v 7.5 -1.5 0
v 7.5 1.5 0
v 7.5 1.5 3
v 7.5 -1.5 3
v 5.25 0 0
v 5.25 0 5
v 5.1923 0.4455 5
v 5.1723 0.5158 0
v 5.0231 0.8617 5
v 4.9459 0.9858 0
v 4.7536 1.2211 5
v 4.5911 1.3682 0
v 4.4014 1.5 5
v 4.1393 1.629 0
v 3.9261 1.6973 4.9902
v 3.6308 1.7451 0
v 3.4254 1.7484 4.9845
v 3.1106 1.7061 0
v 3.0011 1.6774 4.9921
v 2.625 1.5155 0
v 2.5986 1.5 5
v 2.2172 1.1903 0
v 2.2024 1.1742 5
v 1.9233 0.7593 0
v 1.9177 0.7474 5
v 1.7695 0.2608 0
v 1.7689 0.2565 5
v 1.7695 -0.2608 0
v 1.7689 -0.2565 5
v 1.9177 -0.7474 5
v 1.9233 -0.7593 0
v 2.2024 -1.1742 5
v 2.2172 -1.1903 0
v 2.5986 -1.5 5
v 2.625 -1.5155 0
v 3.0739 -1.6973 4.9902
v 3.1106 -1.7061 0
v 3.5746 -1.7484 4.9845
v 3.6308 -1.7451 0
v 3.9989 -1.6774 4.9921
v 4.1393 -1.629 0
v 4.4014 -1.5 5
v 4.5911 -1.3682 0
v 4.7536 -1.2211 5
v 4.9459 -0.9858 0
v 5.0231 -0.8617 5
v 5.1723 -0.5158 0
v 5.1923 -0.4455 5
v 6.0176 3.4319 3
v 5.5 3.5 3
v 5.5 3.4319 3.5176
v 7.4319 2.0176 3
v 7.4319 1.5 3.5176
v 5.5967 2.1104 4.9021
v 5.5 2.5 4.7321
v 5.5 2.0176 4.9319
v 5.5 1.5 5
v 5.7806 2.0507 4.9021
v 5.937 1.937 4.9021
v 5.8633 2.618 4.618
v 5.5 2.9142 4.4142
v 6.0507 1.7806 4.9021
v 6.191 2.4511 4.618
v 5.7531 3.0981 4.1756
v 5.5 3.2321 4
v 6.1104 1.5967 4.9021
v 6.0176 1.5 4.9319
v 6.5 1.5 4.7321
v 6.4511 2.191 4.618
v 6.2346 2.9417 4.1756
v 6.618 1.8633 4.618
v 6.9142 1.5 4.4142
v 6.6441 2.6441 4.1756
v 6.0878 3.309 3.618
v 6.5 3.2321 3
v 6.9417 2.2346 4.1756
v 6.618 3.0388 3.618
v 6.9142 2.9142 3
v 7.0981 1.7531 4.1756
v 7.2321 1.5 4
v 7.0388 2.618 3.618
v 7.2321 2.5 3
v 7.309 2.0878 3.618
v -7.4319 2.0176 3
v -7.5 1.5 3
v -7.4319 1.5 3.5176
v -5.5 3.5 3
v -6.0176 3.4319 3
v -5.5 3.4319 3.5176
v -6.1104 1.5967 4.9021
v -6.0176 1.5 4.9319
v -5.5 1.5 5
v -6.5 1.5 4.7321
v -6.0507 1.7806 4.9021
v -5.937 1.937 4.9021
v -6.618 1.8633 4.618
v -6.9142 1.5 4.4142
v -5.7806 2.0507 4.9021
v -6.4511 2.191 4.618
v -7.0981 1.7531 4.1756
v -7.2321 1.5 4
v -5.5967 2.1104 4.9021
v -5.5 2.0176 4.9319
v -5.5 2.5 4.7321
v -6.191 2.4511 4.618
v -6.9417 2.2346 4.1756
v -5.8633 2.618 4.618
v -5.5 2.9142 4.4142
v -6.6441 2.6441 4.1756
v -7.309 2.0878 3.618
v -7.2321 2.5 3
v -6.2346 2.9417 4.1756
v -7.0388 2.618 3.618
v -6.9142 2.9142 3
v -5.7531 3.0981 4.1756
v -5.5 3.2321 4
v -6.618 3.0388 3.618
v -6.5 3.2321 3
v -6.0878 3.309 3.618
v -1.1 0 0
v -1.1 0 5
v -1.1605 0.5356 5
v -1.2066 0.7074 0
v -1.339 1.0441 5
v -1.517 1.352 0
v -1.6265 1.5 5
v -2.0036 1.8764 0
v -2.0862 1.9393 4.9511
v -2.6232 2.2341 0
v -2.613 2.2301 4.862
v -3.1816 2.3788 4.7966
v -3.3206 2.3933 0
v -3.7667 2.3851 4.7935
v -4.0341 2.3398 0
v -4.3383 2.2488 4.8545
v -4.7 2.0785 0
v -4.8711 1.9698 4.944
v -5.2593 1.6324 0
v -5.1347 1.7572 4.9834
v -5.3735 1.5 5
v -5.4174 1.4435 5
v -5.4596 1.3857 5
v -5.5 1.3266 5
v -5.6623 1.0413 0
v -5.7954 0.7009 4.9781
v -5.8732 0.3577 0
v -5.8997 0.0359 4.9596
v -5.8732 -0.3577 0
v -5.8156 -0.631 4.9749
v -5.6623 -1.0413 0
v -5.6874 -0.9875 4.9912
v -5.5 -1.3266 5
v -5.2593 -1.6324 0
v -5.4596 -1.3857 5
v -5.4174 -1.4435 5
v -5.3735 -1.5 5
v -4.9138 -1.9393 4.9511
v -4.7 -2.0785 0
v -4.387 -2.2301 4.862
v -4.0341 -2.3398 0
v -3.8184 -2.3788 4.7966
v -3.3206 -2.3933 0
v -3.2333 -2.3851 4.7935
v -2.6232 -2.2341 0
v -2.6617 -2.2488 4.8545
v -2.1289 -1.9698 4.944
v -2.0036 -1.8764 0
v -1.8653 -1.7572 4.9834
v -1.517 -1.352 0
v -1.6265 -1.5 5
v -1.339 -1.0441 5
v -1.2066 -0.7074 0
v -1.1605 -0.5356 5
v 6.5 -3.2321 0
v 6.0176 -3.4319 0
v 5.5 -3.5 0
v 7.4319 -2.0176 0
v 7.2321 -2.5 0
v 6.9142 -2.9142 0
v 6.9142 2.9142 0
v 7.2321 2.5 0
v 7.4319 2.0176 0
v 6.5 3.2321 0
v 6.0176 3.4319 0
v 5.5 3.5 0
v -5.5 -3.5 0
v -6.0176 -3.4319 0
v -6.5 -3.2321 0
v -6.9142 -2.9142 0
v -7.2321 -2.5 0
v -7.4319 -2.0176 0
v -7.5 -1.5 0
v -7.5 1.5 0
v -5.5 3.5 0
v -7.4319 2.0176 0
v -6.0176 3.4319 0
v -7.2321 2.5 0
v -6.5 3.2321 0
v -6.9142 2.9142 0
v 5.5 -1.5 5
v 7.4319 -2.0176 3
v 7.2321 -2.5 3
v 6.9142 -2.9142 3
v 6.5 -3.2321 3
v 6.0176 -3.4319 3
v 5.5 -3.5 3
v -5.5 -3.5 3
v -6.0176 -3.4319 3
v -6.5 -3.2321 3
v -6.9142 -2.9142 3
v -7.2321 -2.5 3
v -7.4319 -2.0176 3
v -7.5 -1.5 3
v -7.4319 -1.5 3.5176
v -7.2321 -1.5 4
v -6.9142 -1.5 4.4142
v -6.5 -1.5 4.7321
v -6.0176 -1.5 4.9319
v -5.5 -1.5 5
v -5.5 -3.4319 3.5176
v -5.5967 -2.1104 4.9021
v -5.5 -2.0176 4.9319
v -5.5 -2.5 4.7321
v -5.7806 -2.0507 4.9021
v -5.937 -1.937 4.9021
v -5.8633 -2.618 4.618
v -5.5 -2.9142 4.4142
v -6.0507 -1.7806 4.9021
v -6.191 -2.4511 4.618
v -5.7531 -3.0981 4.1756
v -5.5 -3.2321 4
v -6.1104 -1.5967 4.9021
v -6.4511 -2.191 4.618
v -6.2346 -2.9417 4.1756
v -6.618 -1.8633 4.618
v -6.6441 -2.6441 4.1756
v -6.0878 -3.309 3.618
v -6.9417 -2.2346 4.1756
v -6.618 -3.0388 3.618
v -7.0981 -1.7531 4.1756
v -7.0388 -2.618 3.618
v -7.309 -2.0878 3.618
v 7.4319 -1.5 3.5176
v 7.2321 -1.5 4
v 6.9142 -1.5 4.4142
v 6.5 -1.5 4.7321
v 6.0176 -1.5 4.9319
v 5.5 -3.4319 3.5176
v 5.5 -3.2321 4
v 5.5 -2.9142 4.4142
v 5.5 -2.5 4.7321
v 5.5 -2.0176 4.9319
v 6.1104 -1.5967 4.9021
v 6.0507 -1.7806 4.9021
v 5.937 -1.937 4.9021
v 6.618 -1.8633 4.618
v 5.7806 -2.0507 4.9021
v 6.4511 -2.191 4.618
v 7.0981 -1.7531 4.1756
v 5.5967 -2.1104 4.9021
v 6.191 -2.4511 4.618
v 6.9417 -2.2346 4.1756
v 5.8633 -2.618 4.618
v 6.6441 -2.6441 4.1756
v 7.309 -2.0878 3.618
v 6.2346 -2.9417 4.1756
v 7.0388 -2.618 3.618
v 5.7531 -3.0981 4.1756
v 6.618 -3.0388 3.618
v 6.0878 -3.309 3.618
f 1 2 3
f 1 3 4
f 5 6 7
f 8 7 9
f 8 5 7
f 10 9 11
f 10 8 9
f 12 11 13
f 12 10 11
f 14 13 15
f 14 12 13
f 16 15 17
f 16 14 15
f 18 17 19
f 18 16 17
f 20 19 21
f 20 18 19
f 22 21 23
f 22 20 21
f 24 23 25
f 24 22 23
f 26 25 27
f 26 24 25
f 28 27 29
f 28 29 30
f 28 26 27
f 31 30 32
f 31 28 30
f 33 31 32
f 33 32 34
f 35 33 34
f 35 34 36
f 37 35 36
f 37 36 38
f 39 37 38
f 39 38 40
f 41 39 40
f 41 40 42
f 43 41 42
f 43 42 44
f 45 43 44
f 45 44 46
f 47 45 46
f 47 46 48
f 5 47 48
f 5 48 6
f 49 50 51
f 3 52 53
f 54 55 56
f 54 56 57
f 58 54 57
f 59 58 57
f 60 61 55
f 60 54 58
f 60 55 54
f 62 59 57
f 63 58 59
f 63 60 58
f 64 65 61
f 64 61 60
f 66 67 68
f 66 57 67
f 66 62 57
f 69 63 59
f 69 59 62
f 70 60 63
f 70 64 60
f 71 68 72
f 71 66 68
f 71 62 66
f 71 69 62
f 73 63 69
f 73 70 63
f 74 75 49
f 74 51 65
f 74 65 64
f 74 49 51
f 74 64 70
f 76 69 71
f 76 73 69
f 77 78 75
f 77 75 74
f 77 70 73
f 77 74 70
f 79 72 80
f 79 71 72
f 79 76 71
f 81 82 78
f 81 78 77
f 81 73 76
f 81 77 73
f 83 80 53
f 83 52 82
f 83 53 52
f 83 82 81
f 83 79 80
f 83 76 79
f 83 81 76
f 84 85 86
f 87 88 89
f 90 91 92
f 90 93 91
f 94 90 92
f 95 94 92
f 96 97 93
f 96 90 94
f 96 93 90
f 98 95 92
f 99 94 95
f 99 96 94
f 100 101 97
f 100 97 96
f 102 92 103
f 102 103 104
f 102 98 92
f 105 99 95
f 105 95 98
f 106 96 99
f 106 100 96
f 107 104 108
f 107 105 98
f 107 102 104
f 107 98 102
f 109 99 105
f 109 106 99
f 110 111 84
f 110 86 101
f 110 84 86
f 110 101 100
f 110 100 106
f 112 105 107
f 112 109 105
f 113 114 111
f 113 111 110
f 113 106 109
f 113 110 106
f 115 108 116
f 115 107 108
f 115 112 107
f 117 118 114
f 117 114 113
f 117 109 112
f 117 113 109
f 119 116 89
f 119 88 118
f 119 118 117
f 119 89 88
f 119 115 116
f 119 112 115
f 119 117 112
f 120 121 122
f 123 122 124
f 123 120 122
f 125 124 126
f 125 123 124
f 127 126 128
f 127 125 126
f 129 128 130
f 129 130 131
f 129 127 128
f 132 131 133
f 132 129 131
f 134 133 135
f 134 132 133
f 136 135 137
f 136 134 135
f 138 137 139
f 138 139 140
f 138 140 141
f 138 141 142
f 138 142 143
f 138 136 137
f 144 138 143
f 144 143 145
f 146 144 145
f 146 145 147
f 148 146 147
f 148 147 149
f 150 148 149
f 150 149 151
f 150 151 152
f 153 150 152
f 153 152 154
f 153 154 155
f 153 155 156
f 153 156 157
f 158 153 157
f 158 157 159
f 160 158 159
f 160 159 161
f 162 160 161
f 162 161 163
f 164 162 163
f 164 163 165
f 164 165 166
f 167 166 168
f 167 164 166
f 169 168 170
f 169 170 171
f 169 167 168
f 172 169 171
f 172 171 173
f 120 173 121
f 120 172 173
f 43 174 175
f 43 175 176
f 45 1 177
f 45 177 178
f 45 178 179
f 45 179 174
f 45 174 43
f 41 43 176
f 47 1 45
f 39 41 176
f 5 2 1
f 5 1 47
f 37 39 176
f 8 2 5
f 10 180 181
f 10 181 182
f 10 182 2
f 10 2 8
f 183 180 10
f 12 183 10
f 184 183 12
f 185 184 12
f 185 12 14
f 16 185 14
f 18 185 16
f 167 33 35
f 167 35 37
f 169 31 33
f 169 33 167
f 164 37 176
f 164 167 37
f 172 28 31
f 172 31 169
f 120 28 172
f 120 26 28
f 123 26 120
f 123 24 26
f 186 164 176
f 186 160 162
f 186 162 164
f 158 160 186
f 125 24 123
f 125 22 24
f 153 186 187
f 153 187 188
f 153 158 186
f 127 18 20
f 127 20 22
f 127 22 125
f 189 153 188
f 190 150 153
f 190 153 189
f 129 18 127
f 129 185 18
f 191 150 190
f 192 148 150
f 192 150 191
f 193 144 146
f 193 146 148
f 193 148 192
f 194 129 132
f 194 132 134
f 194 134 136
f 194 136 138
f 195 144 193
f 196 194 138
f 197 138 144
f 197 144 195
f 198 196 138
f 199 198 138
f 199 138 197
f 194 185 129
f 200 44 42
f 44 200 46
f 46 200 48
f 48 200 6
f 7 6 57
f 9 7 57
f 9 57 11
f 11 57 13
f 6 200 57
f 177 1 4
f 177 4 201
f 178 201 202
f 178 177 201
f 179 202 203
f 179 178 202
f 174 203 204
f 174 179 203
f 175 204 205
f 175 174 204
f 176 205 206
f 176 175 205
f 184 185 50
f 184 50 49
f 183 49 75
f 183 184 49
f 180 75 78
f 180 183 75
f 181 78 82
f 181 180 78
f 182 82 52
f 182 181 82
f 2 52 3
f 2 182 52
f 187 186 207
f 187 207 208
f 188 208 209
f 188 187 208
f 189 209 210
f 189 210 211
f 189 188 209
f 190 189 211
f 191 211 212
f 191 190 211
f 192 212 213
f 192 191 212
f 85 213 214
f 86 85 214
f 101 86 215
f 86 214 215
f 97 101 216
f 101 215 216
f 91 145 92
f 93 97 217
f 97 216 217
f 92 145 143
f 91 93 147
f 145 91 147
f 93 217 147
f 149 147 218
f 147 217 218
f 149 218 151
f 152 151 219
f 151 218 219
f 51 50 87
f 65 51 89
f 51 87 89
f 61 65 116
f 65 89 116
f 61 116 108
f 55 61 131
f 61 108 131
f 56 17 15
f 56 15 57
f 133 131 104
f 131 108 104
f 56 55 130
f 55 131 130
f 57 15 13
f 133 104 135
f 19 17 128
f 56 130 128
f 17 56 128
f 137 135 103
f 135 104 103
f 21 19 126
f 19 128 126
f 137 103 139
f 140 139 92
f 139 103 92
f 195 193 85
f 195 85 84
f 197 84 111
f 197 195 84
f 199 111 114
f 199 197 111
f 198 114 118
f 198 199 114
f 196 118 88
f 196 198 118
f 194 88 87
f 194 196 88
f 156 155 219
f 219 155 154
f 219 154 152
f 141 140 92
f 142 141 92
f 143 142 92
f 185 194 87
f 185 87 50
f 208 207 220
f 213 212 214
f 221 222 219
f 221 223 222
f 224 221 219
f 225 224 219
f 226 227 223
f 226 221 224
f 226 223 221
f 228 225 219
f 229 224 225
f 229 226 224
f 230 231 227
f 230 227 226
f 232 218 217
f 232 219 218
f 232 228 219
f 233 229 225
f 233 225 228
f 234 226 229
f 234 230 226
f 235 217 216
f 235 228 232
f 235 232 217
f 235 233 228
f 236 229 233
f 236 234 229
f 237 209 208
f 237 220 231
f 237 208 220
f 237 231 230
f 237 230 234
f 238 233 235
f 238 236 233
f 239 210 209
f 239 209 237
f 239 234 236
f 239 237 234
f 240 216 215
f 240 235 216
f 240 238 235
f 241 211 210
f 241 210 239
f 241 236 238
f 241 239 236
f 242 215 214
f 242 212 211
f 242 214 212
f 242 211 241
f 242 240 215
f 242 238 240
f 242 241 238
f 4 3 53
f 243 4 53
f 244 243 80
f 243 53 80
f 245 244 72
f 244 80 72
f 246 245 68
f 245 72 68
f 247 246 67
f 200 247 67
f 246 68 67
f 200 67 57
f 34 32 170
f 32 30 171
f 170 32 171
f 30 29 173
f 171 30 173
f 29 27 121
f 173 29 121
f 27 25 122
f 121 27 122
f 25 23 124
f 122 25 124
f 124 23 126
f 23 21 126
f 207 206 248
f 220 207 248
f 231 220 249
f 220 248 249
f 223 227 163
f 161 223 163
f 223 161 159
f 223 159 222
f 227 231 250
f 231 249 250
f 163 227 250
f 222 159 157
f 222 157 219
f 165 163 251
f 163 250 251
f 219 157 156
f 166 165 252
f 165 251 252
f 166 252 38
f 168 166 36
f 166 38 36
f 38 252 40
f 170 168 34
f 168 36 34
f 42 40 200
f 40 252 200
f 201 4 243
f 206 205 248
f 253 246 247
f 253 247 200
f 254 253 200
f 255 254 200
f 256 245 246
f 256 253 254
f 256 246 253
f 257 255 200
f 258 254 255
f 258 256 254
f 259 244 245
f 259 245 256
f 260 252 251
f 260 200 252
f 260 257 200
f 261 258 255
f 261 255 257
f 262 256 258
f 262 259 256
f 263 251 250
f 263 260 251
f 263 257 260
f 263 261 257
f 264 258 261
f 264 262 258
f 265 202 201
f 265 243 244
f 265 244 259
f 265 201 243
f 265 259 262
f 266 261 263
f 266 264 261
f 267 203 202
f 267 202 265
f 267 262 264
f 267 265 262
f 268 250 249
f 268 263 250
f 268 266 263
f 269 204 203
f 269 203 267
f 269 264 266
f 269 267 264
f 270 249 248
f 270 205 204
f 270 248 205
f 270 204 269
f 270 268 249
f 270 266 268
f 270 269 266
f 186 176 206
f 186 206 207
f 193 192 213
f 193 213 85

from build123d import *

# Parameters (mm, degrees)
SKETCH1_R           = 2.399999999999999
SKETCH1_R_2         = 1.75
BOSS_EXTRUDE1_DEPTH = 5
FILLET1_R           = 2


with BuildPart() as part:
    # Sketch1 → Boss-Extrude1 (new body)
    with BuildSketch(Plane.XY):
        with BuildLine():
            Line((-5.500000000000002, 3.5), (5.499999999999998, 3.5))
            ThreePointArc((5.499999999999998, 3.5), (6.914213562373094, 2.914213562373095), (7.499999999999998, 1.4999999999999998))
            Line((7.499999999999998, 1.4999999999999998), (7.499999999999998, -1.5000000000000002))
            ThreePointArc((7.499999999999998, -1.5000000000000002), (6.914213562373094, -2.914213562373096), (5.499999999999998, -3.500000000000001))
            Line((5.499999999999998, -3.500000000000001), (-5.500000000000002, -3.500000000000001))
            ThreePointArc((-5.500000000000002, -3.500000000000001), (-6.914213562373097, -2.914213562373096), (-7.500000000000002, -1.5000000000000007))
            Line((-7.500000000000002, -1.5000000000000007), (-7.500000000000002, 1.4999999999999993))
            ThreePointArc((-7.500000000000002, 1.4999999999999993), (-6.914213562373097, 2.914213562373095), (-5.500000000000002, 3.5))
        make_face()
        with Locations((-3.5000000000000013, 0)):
            Circle(SKETCH1_R, mode=Mode.SUBTRACT)
        with Locations((3.5000000000000013, 1.29e-15)):
            Circle(SKETCH1_R_2, mode=Mode.SUBTRACT)
    extrude(amount=BOSS_EXTRUDE1_DEPTH)

    # Fillet1
    # the kernel refuses this fillet: 2 mm, written as the material it takes off along each edge
    with BuildSketch(Plane(origin=(-5.500000000000001, 1.4999999999999987, 5), x_dir=(-1, 3.3e-16, 0), z_dir=(-3.3e-16, -1, 0))) as fillet1_piece_1:
        with BuildLine():
            CenterArc((2.000000000000001 - FILLET1_R, FILLET1_R), FILLET1_R, 270, 90)
            Line((2.000000000000001 - FILLET1_R, 0), (2.000000000000001, 0))
            Line((2.000000000000001, 0), (2.000000000000001, FILLET1_R))
        make_face()
    revolve(axis=Axis((-5.500000000000001, 1.4999999999999987, 5), (0, 0, -1)), revolution_arc=89.99999999999996, mode=Mode.SUBTRACT)
    with BuildSketch(Plane(origin=(-7.500000000000002, -1.5000000000000007, 5), x_dir=(0, 0, -1), z_dir=(0, 1, 0)), Plane(origin=(7.499999999999998, 1.4999999999999998, 5), x_dir=(0, 0, -1), z_dir=(0, -1, 0))) as fillet1_piece_2:
        with BuildLine():
            CenterArc((FILLET1_R, -FILLET1_R), FILLET1_R, 90, 90)
            Line((0, -FILLET1_R), (0, 0))
            Line((0, 0), (FILLET1_R, 0))
        make_face()
    extrude(amount=3, mode=Mode.SUBTRACT)
    with BuildSketch(Plane(origin=(-5.500000000000002, -1.5000000000000002, 5), x_dir=(0, -1, 0), z_dir=(1, 0, 0))) as fillet1_piece_3:
        with BuildLine():
            CenterArc((2.000000000000001 - FILLET1_R, FILLET1_R), FILLET1_R, 270, 90)
            Line((2.000000000000001 - FILLET1_R, 0), (2.000000000000001, 0))
            Line((2.000000000000001, 0), (2.000000000000001, FILLET1_R))
        make_face()
    revolve(axis=Axis((-5.500000000000002, -1.5000000000000002, 5), (0, 0, -1)), revolution_arc=89.99999999999999, mode=Mode.SUBTRACT)
    with BuildSketch(Plane(origin=(5.499999999999998, -3.500000000000001, 5), x_dir=(0, 0, -1), z_dir=(-1, 0, 0)), Plane(origin=(-5.500000000000002, 3.5, 5), x_dir=(0, 0, -1), z_dir=(1, 0, 0))) as fillet1_piece_4:
        with BuildLine():
            CenterArc((FILLET1_R, -FILLET1_R), FILLET1_R, 90, 90)
            Line((0, -FILLET1_R), (0, 0))
            Line((0, 0), (FILLET1_R, 0))
        make_face()
    extrude(amount=11, mode=Mode.SUBTRACT)
    with BuildSketch(Plane(origin=(5.499999999999999, -1.5000000000000018, 5), x_dir=(1, 7.8e-16, 0), z_dir=(-7.8e-16, 1, 0))) as fillet1_piece_5:
        with BuildLine():
            CenterArc((1.9999999999999991 - FILLET1_R, FILLET1_R), FILLET1_R, 270, 90)
            Line((1.9999999999999991 - FILLET1_R, 0), (1.9999999999999991, 0))
            Line((1.9999999999999991, 0), (1.9999999999999991, FILLET1_R))
        make_face()
    revolve(axis=Axis((5.499999999999999, -1.5000000000000018, 5), (0, 0, -1)), revolution_arc=90.00000000000007, mode=Mode.SUBTRACT)
    with BuildSketch(Plane(origin=(5.499999999999999, 1.5000000000000013, 5), x_dir=(-4.4e-16, 1, 0), z_dir=(-1, -4.4e-16, 0))) as fillet1_piece_6:
        with BuildLine():
            CenterArc((1.9999999999999987 - FILLET1_R, FILLET1_R), FILLET1_R, 270, 90)
            Line((1.9999999999999987 - FILLET1_R, 0), (1.9999999999999987, 0))
            Line((1.9999999999999987, 0), (1.9999999999999987, FILLET1_R))
        make_face()
    revolve(axis=Axis((5.499999999999999, 1.5000000000000013, 5), (0, 0, -1)), revolution_arc=90.00000000000007, mode=Mode.SUBTRACT)


solid = part.part
